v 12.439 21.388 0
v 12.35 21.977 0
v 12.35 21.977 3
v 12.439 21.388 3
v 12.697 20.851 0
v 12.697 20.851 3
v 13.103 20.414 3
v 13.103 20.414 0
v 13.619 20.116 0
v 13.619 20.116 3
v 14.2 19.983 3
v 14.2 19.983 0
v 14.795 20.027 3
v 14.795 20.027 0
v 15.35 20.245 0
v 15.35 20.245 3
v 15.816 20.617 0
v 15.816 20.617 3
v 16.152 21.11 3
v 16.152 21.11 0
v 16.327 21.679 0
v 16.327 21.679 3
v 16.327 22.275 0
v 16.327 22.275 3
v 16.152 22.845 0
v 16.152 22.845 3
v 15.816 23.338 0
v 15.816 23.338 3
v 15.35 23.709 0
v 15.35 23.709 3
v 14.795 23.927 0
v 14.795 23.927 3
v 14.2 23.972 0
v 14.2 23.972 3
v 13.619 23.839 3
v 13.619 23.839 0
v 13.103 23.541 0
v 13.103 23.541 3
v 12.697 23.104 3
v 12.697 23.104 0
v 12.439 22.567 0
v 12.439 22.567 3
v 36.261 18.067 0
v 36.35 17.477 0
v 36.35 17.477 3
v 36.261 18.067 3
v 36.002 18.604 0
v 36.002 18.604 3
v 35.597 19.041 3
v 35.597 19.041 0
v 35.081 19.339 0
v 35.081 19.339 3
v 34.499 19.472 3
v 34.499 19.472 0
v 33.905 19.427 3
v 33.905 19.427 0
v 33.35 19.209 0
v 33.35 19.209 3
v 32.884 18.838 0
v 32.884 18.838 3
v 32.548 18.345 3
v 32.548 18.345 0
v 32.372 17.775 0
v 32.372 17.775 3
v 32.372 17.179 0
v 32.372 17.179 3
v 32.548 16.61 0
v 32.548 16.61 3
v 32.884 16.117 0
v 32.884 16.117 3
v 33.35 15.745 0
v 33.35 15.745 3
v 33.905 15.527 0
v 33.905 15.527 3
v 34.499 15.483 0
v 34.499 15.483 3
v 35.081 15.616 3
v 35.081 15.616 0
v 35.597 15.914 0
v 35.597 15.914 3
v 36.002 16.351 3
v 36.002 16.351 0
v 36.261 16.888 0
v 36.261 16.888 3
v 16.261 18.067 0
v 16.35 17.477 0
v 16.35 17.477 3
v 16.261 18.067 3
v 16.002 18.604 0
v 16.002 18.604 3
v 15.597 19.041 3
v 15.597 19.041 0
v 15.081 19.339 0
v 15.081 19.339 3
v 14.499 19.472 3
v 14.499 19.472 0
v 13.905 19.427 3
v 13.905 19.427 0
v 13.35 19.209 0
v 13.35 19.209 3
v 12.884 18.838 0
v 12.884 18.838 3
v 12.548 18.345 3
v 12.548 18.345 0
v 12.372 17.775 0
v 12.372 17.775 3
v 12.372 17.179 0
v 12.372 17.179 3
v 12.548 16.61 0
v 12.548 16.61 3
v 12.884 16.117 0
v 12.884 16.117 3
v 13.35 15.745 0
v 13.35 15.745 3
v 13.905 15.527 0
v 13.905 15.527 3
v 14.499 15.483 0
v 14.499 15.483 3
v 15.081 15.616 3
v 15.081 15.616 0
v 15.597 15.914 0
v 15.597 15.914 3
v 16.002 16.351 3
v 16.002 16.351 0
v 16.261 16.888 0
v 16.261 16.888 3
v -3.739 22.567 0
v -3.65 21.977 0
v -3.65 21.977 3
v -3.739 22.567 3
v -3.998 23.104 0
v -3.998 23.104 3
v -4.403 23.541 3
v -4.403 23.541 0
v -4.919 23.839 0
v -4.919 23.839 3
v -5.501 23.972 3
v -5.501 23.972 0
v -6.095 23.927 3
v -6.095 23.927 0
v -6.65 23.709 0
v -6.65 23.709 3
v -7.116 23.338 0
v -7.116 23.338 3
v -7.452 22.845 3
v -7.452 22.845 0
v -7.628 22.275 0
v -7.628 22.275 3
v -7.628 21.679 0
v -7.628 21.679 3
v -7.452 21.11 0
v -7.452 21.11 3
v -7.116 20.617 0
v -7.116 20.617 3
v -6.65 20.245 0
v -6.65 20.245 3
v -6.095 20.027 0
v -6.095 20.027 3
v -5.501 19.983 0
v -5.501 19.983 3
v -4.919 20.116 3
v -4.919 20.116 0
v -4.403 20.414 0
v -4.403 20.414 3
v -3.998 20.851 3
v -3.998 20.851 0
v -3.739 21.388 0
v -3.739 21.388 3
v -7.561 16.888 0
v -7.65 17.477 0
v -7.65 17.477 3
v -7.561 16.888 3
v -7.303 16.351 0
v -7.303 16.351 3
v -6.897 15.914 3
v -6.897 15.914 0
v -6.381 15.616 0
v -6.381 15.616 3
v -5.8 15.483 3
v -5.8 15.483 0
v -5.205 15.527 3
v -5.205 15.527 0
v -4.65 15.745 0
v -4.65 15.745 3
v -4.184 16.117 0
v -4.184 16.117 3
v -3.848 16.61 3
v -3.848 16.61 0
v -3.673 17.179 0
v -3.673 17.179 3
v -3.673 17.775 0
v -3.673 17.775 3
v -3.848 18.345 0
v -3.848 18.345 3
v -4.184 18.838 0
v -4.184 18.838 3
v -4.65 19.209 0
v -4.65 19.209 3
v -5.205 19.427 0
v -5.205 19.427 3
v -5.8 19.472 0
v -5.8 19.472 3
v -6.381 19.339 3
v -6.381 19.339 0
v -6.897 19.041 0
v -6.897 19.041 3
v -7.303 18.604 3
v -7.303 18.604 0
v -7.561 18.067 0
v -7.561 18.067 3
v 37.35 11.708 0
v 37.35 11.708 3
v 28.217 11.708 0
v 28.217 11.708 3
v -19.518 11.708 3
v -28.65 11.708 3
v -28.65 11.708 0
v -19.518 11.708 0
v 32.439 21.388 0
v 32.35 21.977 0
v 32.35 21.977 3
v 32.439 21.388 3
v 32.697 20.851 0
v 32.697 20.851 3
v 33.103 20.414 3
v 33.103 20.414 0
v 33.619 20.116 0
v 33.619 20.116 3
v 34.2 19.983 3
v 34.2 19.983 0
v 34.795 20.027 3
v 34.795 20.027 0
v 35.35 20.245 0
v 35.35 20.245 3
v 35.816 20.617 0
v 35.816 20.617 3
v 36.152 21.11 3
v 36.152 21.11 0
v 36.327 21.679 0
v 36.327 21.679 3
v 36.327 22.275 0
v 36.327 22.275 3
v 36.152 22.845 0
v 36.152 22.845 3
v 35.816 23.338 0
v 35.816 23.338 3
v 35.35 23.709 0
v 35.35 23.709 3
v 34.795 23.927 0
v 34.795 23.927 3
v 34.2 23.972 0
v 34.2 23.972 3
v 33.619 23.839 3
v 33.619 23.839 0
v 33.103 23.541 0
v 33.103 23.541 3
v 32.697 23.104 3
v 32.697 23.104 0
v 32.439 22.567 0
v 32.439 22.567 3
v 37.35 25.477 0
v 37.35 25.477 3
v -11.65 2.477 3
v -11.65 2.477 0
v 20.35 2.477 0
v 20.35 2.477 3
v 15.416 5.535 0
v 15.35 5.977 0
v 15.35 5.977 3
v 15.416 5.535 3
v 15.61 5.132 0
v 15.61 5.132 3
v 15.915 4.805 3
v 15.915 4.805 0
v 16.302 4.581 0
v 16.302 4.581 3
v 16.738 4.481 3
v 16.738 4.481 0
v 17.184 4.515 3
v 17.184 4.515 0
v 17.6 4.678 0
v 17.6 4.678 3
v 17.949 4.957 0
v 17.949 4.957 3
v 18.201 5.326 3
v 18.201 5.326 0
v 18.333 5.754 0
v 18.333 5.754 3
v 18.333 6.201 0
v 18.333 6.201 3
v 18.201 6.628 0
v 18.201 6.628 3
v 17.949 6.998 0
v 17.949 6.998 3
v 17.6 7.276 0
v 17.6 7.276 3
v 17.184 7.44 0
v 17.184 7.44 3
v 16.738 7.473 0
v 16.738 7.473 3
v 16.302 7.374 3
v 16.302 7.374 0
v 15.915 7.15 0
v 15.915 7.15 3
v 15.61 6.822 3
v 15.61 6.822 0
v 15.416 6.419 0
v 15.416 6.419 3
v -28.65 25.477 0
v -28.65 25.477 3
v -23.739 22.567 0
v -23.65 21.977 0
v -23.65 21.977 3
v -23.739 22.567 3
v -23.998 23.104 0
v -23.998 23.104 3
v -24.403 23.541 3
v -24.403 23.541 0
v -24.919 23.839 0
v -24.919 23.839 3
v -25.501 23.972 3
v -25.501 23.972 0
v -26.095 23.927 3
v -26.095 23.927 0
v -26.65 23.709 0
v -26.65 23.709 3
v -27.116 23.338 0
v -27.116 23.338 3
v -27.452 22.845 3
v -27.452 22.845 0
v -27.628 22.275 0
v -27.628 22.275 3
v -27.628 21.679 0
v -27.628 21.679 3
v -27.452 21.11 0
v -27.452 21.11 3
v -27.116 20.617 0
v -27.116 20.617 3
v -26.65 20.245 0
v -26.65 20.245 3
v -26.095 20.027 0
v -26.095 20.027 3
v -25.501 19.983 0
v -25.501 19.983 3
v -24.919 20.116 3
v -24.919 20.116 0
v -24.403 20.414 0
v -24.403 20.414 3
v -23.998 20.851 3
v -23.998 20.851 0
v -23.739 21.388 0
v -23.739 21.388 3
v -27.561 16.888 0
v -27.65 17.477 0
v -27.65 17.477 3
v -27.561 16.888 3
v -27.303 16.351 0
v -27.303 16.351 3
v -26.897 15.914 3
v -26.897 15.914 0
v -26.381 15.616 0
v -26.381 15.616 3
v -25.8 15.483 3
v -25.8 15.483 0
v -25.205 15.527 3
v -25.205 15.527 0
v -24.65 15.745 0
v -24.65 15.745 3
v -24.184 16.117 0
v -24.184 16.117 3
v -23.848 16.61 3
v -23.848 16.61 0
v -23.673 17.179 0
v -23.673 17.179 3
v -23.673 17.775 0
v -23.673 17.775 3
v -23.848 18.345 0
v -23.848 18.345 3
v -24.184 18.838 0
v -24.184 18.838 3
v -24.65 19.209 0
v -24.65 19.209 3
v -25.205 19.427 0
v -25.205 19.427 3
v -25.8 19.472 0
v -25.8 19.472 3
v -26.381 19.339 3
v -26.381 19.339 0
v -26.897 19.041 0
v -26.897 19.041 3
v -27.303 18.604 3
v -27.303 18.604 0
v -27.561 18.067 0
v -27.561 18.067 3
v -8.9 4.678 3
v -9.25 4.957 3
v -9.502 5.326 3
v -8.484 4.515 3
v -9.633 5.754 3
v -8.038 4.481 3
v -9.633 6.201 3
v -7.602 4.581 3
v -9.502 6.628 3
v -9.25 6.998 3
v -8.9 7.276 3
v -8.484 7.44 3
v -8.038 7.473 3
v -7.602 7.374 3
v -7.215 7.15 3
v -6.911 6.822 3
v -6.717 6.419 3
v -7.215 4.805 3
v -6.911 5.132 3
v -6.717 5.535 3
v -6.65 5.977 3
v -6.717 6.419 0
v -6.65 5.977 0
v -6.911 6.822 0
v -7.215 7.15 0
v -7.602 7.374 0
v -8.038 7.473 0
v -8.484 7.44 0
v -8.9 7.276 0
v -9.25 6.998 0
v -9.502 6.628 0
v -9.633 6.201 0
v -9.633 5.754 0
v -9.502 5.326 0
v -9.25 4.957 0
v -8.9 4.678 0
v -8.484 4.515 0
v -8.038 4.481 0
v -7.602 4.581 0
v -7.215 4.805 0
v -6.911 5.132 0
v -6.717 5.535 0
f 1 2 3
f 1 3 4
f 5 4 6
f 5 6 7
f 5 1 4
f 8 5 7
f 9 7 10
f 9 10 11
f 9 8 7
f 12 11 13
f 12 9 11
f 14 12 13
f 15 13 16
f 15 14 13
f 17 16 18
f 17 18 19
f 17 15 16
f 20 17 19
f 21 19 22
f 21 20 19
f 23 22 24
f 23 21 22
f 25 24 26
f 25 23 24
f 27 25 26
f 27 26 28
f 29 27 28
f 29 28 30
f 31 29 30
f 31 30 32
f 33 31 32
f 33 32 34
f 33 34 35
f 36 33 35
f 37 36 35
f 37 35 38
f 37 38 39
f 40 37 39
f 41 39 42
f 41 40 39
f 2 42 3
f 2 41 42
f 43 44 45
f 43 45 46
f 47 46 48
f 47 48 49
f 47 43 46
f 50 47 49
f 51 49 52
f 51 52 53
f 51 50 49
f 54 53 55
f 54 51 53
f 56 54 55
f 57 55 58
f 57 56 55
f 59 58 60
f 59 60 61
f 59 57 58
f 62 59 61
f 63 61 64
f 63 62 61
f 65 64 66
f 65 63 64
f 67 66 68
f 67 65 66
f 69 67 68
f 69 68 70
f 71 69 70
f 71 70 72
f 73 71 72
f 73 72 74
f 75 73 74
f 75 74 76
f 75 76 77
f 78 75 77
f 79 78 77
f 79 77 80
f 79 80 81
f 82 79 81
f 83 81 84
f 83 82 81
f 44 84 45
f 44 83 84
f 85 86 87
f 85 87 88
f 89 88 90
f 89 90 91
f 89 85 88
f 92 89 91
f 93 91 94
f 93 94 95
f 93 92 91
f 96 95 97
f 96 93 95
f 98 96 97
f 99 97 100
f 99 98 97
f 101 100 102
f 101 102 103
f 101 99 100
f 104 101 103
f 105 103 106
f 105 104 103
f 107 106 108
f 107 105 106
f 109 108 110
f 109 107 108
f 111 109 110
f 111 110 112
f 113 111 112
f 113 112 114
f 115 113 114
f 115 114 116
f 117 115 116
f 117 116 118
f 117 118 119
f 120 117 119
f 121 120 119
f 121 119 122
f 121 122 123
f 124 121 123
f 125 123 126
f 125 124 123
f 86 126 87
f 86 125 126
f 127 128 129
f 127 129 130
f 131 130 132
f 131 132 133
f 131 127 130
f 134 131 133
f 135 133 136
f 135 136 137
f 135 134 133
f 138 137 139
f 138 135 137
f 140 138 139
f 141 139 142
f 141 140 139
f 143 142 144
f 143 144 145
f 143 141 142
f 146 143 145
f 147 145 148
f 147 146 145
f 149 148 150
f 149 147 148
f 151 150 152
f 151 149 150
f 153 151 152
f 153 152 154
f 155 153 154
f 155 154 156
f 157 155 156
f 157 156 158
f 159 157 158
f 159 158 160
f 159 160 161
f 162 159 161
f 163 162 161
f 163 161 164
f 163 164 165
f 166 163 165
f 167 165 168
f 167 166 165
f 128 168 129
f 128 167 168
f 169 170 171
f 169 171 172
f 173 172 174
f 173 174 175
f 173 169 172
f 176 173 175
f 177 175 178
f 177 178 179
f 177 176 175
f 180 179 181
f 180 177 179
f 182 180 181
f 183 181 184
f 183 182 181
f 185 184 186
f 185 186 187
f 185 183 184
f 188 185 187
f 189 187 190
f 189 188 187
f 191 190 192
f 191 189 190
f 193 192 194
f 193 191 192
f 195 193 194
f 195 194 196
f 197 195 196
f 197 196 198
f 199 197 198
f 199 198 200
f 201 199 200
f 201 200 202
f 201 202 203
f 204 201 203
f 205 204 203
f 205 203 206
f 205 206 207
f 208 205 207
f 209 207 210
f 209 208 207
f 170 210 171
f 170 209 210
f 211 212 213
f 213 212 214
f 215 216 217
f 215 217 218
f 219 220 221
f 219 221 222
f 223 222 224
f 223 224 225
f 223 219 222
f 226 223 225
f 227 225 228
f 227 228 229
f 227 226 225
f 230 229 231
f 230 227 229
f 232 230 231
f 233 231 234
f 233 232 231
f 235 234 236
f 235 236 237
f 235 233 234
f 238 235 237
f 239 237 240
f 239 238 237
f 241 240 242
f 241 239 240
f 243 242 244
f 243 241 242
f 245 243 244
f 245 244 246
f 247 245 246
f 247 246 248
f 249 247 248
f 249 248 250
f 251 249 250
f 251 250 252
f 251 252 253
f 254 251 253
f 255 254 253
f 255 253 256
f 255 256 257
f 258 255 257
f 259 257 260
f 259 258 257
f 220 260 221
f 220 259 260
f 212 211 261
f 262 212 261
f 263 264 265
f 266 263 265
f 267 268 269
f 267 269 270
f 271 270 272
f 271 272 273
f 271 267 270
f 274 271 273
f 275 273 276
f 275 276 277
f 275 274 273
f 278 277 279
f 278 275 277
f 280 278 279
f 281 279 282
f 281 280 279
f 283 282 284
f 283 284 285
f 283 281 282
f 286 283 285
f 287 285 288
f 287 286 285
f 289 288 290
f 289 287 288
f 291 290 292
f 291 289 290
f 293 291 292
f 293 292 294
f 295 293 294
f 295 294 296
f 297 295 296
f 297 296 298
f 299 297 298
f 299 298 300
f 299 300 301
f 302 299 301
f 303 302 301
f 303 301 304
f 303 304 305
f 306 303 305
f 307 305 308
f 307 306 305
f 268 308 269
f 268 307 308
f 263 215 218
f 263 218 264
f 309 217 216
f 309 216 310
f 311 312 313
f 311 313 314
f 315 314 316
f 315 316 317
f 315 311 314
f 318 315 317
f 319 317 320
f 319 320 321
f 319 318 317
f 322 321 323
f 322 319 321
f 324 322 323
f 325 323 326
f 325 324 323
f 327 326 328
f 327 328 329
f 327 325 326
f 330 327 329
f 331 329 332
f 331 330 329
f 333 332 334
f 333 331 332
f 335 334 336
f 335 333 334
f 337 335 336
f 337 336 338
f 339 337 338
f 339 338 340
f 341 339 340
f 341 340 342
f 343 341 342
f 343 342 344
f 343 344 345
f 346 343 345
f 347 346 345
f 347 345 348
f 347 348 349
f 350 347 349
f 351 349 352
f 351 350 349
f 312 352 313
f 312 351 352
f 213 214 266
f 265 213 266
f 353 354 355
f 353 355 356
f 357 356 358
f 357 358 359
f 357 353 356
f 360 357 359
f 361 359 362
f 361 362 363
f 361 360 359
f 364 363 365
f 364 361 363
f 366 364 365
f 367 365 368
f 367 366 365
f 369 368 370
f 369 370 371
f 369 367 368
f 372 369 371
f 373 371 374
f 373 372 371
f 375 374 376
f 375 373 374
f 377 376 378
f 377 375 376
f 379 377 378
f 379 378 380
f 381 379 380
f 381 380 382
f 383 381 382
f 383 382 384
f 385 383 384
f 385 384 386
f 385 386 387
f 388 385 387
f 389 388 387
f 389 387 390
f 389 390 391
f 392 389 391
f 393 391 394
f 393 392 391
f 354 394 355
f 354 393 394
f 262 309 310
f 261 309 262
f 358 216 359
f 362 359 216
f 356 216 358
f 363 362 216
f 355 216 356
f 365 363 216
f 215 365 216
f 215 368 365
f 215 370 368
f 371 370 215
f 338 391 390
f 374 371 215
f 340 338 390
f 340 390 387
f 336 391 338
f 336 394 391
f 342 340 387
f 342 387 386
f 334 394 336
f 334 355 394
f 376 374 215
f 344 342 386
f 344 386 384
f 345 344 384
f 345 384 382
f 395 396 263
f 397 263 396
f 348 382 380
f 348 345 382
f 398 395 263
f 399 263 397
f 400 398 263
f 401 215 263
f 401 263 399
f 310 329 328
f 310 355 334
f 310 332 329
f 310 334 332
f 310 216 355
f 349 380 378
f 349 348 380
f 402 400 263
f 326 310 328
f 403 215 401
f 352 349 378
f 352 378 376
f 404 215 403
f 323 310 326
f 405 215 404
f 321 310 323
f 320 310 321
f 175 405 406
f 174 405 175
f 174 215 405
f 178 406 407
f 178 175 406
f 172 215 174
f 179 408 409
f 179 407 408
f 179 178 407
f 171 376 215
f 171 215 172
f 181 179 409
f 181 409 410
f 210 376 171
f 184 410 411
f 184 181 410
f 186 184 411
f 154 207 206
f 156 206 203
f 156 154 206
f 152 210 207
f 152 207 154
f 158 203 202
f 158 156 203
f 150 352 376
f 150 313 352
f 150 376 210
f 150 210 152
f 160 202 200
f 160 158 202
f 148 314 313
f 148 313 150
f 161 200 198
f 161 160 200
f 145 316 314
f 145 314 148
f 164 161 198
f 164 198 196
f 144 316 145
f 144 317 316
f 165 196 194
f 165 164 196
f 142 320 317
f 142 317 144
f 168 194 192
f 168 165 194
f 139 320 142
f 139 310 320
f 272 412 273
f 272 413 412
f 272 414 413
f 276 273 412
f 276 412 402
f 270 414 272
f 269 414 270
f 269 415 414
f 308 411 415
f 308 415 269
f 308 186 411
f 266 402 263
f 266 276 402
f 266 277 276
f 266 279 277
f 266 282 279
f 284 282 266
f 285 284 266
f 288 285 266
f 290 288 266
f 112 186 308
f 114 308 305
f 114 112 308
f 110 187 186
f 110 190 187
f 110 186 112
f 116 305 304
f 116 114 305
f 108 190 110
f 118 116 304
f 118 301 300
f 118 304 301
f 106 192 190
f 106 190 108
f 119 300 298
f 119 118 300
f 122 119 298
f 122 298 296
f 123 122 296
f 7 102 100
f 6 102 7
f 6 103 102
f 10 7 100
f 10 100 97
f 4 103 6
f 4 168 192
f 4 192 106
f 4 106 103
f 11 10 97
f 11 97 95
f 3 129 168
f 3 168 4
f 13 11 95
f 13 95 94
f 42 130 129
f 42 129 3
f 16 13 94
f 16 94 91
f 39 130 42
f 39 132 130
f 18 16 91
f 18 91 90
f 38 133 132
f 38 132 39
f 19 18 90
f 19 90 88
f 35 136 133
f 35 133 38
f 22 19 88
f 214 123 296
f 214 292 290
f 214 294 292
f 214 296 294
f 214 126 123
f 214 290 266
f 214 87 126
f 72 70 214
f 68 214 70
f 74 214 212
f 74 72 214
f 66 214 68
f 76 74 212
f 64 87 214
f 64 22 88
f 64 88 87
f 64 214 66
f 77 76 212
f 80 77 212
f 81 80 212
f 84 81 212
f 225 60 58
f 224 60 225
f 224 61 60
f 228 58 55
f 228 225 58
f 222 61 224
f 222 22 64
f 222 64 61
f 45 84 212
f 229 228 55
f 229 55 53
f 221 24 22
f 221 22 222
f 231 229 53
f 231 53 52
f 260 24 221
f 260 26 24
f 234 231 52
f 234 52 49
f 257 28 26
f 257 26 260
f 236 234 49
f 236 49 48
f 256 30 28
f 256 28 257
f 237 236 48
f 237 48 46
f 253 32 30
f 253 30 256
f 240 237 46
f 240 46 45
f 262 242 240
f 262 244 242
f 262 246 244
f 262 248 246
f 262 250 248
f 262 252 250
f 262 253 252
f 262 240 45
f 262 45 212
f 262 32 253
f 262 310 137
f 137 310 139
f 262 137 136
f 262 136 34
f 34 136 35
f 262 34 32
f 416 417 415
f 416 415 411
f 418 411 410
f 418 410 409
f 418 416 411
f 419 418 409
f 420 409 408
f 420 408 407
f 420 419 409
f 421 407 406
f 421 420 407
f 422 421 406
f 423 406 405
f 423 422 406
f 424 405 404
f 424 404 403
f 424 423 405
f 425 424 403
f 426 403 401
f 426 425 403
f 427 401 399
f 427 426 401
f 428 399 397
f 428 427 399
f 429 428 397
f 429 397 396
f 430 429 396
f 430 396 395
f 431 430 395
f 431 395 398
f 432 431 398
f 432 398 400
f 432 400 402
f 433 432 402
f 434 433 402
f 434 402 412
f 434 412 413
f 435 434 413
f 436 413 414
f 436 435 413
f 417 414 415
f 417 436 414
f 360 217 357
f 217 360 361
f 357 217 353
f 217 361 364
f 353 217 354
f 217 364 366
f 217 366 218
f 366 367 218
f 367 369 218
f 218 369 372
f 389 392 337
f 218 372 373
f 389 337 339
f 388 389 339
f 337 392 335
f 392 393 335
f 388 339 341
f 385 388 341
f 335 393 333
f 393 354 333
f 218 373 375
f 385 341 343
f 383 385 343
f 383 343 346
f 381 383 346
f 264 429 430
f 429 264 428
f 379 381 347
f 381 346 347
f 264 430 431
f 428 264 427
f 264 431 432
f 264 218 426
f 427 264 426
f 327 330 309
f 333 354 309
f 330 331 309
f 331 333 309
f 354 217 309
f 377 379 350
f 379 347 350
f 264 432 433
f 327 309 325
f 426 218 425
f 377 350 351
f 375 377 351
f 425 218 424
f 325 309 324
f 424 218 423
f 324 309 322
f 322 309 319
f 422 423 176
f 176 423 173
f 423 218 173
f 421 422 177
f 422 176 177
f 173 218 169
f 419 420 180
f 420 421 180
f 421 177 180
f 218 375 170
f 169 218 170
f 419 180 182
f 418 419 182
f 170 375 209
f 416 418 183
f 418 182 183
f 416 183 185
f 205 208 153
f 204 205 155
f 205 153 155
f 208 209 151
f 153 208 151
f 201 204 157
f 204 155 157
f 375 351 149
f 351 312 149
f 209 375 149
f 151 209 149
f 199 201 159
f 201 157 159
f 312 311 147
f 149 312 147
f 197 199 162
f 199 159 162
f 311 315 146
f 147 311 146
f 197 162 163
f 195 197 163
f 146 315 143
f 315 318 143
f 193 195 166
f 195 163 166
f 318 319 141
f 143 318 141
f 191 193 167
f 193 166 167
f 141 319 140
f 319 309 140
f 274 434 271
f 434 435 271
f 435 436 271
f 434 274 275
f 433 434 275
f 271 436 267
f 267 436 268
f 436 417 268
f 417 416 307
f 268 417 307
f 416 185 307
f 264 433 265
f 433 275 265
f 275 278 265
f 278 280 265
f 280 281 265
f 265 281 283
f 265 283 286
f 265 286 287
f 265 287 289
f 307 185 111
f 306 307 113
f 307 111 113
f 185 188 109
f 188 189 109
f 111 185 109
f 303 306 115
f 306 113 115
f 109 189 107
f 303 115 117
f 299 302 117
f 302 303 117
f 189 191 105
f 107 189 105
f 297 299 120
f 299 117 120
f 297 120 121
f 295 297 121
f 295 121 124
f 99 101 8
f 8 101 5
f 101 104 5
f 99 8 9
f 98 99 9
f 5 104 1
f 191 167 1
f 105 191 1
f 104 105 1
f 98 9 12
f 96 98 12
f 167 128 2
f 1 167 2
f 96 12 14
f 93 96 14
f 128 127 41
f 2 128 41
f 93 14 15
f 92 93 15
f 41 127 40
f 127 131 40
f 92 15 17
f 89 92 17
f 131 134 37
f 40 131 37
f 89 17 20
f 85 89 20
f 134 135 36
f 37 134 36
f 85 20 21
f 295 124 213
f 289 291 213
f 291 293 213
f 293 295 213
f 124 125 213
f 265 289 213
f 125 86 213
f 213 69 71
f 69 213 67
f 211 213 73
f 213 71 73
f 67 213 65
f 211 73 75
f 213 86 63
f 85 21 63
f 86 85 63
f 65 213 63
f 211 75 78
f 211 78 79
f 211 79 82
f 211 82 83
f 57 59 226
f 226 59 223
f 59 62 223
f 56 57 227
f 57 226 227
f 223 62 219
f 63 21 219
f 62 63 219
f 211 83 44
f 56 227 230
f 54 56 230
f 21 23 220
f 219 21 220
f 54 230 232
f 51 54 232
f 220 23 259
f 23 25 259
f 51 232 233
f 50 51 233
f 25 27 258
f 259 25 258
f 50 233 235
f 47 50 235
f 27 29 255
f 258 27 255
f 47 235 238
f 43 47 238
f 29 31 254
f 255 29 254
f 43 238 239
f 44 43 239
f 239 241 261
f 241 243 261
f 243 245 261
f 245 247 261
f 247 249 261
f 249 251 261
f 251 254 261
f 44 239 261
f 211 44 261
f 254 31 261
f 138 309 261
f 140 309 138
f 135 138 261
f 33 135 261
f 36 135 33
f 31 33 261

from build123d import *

# Parameters (mm, degrees)
SKETCH_1_W          = 66
SKETCH_1_H          = 23
SKETCH_1_R          = 2
SKETCH_1_R_2        = 1.5
EXTRUDE_1_DEPTH     = 3
CUT_EXTRUDE_1_DEPTH = 46.311168738


with BuildPart() as part:
    # 草图1 → 凸台-拉伸1 (new body)
    with BuildSketch(Plane.XY):
        with Locations((4.349837666, 13.977276909)):
            Rectangle(SKETCH_1_W, SKETCH_1_H)
        with Locations((-5.650162334, 21.977276909)):
            Circle(SKETCH_1_R, mode=Mode.SUBTRACT)
        with Locations((-25.650162334, 21.977276909)):
            Circle(SKETCH_1_R, mode=Mode.SUBTRACT)
        with Locations(Location((14.349837666, 21.977276909, 0), (0, 0, 180))):
            Circle(SKETCH_1_R, mode=Mode.SUBTRACT)
        with Locations(Location((34.349837666, 21.977276909, 0), (0, 0, 180))):
            Circle(SKETCH_1_R, mode=Mode.SUBTRACT)
        with Locations((34.349837666, 17.477276909)):
            Circle(SKETCH_1_R, mode=Mode.SUBTRACT)
        with Locations((14.349837666, 17.477276909)):
            Circle(SKETCH_1_R, mode=Mode.SUBTRACT)
        with Locations(Location((-5.650162334, 17.477276909, 0), (0, 0, 180))):
            Circle(SKETCH_1_R, mode=Mode.SUBTRACT)
        with Locations(Location((-25.650162334, 17.477276909, 0), (0, 0, 180))):
            Circle(SKETCH_1_R, mode=Mode.SUBTRACT)
        with Locations((-8.150162334, 5.977276909)):
            Circle(SKETCH_1_R_2, mode=Mode.SUBTRACT)
        with Locations(Location((16.849837666, 5.977276909, 0), (0, 0, 180))):
            Circle(SKETCH_1_R_2, mode=Mode.SUBTRACT)
    extrude(amount=EXTRUDE_1_DEPTH)

    # 草图2 → 切除-拉伸1 (cut, through all)
    with BuildSketch(Plane.XY.offset(3)):
        Polygon((-28.650162334, 11.707841664), (-19.517537848, 11.707841664), (-11.650162334, 2.477276909), (-28.650162334, 2.477276909), align=None)
        Polygon((20.349837666, 2.477276909), (37.349837666, 2.477276909), (37.349837666, 11.707841664), (28.217213181, 11.707841664), align=None)
    extrude(amount=-CUT_EXTRUDE_1_DEPTH, mode=Mode.SUBTRACT)


solid = part.part
